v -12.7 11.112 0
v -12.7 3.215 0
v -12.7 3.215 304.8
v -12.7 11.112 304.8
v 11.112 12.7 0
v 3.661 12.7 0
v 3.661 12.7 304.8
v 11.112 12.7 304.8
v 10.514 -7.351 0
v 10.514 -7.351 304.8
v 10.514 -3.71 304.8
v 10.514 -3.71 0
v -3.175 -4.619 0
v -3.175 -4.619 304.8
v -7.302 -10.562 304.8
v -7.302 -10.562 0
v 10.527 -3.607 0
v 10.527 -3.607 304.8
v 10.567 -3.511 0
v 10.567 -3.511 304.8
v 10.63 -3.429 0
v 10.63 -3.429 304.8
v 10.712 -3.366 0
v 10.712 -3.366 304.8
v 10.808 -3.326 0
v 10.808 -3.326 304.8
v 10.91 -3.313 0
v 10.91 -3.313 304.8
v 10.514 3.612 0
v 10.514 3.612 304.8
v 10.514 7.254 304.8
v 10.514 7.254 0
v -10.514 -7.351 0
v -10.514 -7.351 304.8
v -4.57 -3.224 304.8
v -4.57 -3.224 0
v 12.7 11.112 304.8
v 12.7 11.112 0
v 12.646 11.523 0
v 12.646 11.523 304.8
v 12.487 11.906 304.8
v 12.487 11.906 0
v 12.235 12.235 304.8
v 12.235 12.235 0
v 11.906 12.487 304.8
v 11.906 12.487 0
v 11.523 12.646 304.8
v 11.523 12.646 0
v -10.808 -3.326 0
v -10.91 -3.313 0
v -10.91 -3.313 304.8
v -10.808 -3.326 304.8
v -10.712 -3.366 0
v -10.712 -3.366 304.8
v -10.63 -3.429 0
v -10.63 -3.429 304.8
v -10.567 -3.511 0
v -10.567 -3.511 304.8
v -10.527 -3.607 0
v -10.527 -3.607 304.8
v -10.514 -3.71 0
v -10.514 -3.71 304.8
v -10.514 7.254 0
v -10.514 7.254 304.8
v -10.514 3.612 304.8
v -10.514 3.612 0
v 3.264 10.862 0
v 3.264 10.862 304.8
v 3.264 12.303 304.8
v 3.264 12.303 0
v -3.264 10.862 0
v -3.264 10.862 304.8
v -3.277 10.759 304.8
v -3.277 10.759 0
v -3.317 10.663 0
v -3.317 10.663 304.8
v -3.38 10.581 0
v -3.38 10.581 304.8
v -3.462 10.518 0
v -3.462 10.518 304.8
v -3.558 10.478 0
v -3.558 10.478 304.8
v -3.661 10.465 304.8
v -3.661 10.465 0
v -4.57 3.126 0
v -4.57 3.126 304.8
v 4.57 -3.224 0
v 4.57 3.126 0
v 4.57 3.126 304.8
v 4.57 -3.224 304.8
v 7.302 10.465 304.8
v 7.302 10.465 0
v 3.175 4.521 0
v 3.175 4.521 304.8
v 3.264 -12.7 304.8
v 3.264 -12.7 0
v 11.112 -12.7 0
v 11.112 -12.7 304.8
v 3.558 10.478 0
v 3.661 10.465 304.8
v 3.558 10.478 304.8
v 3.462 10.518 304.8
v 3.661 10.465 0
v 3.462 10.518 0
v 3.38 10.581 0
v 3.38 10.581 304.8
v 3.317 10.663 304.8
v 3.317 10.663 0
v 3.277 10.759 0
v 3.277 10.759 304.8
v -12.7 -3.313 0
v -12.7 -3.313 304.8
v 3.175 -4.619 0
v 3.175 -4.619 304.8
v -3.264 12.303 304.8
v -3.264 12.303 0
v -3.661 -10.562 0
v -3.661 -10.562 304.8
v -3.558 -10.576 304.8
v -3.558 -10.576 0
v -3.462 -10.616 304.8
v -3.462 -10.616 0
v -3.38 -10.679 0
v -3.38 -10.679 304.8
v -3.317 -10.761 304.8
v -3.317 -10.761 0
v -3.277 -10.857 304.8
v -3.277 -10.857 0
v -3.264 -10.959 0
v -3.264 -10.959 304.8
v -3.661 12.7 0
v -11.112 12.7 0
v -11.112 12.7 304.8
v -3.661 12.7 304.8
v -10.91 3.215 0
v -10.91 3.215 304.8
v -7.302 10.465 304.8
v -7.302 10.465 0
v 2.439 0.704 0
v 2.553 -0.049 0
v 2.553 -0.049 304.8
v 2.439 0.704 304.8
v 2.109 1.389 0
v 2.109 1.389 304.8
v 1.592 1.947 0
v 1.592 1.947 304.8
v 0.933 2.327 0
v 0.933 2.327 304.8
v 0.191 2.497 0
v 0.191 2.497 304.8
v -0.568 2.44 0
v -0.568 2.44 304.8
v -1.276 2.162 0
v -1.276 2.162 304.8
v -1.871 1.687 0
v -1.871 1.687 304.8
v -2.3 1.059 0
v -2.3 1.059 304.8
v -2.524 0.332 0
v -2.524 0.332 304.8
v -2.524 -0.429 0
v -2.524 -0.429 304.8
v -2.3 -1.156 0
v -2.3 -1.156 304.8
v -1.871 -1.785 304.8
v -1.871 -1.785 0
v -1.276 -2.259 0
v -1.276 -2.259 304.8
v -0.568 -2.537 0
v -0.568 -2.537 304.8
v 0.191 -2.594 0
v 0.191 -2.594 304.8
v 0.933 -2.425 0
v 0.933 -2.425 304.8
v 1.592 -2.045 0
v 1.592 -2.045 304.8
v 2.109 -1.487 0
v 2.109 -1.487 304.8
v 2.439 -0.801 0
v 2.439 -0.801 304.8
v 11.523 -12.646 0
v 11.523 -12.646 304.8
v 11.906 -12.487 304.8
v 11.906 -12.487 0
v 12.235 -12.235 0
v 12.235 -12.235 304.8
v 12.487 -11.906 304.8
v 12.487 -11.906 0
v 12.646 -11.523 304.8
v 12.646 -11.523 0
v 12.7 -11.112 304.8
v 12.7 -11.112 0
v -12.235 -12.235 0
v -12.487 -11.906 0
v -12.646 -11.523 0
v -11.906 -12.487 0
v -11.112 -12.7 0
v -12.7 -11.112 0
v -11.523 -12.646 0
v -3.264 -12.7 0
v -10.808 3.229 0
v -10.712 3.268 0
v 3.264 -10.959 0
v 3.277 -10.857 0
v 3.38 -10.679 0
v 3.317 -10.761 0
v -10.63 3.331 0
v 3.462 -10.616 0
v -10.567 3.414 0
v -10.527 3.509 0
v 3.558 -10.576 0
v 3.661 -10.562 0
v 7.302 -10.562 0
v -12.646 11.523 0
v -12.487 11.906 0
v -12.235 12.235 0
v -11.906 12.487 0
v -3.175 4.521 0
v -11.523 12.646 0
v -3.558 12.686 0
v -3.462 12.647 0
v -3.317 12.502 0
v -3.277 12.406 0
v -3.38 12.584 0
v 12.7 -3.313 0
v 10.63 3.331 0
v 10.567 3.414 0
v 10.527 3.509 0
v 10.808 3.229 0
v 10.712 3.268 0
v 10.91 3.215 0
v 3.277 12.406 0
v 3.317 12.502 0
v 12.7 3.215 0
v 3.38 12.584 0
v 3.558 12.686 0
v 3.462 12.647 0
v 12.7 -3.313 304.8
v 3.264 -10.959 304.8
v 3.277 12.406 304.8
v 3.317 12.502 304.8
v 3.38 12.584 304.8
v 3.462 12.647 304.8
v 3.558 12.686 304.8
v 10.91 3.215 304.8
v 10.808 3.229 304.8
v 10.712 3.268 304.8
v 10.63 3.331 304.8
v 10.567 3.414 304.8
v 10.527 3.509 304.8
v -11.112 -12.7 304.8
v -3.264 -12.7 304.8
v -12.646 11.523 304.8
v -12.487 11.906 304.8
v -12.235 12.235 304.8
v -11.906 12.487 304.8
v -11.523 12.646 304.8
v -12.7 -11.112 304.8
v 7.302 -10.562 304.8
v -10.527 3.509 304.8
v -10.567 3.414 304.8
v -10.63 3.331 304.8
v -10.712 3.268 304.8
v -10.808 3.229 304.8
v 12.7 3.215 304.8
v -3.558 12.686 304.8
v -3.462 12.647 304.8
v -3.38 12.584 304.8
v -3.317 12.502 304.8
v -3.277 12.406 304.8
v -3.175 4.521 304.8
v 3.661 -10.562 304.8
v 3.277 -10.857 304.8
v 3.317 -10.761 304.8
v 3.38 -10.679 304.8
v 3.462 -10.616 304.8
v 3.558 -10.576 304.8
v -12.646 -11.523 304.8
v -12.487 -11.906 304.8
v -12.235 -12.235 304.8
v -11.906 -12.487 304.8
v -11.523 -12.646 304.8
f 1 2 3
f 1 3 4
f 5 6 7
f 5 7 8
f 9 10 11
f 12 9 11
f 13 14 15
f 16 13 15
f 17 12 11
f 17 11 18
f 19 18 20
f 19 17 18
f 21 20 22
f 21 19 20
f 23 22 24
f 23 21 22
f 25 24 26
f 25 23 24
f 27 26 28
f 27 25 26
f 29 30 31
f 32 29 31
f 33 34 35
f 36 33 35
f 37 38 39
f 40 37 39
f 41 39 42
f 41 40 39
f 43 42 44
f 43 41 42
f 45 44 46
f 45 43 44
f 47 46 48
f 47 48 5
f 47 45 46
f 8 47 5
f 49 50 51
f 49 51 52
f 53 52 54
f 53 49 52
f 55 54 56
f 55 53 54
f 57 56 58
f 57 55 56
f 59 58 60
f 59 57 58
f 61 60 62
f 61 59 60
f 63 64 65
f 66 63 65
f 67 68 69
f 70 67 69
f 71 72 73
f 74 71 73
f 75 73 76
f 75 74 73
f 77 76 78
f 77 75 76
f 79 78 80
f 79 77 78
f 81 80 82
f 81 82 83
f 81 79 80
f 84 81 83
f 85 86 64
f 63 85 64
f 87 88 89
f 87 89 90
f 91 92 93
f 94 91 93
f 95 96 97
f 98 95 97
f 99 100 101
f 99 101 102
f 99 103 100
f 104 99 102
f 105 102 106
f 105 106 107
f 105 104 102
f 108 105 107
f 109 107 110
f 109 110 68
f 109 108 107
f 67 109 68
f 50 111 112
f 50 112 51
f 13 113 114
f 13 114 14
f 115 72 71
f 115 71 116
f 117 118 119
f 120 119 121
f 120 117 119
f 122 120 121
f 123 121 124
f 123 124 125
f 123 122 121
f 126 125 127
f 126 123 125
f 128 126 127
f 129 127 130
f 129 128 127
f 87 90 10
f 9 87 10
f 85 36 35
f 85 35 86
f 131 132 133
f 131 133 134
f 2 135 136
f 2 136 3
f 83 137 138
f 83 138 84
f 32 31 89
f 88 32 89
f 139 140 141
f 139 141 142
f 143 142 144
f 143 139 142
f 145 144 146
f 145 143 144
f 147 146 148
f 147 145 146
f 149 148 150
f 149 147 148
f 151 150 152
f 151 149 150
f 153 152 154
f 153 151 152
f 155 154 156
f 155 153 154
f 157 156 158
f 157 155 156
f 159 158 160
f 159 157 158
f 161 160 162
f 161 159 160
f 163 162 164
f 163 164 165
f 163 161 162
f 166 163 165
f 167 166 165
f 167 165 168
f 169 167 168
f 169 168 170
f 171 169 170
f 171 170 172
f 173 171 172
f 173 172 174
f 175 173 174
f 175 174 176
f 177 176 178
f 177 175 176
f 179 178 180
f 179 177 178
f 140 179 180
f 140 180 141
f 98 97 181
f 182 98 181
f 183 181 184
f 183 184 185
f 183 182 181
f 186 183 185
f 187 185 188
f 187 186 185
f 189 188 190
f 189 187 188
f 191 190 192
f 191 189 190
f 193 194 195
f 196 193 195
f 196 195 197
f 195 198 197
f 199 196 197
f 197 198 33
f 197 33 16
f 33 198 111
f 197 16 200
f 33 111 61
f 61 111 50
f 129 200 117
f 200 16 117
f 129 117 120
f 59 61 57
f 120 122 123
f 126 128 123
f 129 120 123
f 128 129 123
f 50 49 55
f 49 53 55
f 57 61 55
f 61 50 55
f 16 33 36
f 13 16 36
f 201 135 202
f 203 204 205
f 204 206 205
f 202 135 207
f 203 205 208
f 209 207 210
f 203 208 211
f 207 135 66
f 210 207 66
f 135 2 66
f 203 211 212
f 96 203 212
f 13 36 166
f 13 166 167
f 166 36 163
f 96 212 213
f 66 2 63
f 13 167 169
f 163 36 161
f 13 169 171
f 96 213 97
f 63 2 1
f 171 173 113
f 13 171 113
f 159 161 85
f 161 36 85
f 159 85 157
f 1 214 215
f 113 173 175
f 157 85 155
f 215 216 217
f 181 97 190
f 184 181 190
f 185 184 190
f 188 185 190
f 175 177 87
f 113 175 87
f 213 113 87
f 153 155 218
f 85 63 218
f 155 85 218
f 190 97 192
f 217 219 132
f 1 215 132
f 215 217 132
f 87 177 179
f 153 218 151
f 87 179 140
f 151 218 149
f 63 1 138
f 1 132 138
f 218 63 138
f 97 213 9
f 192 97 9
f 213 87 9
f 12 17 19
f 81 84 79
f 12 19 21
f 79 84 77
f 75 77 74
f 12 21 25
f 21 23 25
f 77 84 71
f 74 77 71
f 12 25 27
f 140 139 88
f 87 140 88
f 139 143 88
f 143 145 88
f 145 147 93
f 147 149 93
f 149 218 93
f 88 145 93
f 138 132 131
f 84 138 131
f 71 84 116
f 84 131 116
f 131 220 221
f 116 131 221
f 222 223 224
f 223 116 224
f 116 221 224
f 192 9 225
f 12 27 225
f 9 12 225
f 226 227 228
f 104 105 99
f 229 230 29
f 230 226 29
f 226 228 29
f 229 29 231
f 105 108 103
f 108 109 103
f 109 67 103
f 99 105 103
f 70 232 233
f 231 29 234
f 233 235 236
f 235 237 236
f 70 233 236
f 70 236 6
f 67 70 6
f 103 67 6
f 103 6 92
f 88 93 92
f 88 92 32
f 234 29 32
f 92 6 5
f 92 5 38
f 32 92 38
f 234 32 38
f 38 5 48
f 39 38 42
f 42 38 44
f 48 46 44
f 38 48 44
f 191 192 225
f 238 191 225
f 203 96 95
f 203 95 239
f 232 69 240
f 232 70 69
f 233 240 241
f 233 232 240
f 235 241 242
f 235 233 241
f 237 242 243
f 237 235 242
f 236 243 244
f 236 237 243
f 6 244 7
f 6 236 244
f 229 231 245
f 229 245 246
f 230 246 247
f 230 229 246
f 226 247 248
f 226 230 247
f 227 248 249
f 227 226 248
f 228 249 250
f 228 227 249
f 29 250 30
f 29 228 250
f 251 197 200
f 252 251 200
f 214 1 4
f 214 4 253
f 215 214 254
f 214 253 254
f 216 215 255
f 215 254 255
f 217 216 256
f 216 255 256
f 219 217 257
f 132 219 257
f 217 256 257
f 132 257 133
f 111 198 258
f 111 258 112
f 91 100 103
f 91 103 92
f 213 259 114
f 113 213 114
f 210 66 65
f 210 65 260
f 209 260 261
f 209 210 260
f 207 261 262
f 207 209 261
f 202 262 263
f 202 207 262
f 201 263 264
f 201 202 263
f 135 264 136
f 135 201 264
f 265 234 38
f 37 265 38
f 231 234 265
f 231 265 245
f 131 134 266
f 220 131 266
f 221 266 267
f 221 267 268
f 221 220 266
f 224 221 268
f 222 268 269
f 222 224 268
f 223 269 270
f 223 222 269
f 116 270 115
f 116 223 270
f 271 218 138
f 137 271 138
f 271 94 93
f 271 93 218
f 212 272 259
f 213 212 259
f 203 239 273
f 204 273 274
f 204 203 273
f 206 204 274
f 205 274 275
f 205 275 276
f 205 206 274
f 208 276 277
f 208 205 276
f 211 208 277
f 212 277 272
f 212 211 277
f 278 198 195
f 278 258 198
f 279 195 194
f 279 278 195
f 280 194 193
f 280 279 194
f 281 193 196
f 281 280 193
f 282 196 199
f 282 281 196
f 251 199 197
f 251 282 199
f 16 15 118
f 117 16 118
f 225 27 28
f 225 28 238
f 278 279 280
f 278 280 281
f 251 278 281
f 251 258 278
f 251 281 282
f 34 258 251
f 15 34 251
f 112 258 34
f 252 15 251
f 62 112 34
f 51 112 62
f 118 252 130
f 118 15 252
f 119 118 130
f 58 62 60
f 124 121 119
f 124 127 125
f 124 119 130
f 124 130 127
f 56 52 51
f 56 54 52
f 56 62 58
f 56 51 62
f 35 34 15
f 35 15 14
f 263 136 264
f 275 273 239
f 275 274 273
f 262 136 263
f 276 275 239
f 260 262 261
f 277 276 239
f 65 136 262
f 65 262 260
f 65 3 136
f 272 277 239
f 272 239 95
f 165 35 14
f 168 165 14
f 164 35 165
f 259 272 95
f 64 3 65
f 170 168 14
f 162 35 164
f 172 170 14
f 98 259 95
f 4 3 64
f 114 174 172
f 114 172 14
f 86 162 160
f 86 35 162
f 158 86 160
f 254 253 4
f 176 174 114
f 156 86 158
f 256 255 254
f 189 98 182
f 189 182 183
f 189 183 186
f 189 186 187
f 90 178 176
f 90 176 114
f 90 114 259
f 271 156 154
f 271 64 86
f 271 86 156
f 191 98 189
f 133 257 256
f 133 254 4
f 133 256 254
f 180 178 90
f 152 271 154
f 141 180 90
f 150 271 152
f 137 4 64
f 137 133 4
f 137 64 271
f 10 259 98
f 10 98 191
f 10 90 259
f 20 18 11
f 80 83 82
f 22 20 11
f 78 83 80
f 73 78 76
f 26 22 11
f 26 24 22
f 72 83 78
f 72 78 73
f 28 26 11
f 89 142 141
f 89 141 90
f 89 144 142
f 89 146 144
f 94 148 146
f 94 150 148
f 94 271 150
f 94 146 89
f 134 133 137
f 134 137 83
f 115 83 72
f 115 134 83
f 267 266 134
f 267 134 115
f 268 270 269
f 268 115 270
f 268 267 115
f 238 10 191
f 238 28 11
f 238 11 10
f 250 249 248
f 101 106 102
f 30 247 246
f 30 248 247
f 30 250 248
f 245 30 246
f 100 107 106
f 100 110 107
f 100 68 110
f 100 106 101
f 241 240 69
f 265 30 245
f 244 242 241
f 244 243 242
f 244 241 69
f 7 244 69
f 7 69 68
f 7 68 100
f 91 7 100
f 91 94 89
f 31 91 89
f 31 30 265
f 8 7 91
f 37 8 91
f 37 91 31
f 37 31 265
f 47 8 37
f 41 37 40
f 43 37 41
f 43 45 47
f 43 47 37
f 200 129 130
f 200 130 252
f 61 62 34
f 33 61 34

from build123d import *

# Parameters (mm, degrees)
SKETCH1_W           = 25.4
SKETCH1_H           = 25.4
BOSS_EXTRUDE1_DEPTH = 304.8
FILLET1_R           = 1.5875
HOLE1_OUTLINE_R     = 2.5527
HOLE1_DEPTH         = 304.8
SKETCH7_W           = 6.5278
SKETCH7_H           = 2.2352
CUT_EXTRUDE2_DEPTH  = 304.8
FILLET4_R           = 0.396875
CIRPATTERN2_DEPTH   = 304.8


# Read off the part's stored shape, not the designer's step: Hole1, CirPattern2
with BuildPart() as part:
    # Sketch1 → Boss-Extrude1 (new body)
    with BuildSketch(Plane.XY):
        Rectangle(SKETCH1_W, SKETCH1_H)
    extrude(amount=BOSS_EXTRUDE1_DEPTH)

    # Fillet1
    fillet1_edges = [part.edges().sort_by_distance(p)[0] for p in [
        (12.7, -12.7, 152.4),
        (-12.7, -12.7, 152.4),
        (-12.7, 12.7, 152.4),
        (12.7, 12.7, 152.4),
    ]]
    fillet(fillet1_edges, radius=FILLET1_R)

    # Hole1 outline → Hole1 (cut)
    with BuildSketch(Plane.XY):
        with Locations((0, -0.048792482)):
            Circle(HOLE1_OUTLINE_R)
    extrude(amount=HOLE1_DEPTH, mode=Mode.SUBTRACT)

    # Sketch7 → Cut-Extrude2 (cut)
    with BuildSketch(Plane.XY.offset(304.8)):
        with Locations((0, 11.5824)):
            Rectangle(SKETCH7_W, SKETCH7_H)
        Polygon((-3.175, 4.5212), (-7.3025, 10.4648), (7.3025, 10.4648), (3.175, 4.5212), align=None)
    extrude(amount=-CUT_EXTRUDE2_DEPTH, mode=Mode.SUBTRACT)

    # Fillet4
    fillet4_edges = [part.edges().sort_by_distance(p)[0] for p in [
        (-3.2639, 10.4648, 152.4),
        (-3.2639, 12.7, 152.4),
        (3.2639, 12.7, 152.4),
        (3.2639, 10.4648, 152.4),
    ]]
    fillet(fillet4_edges, radius=FILLET4_R)

    # CirPattern2 outline → CirPattern2 (cut)
    with BuildSketch(Plane.XY):
        with BuildLine():
            ThreePointArc((-3.660775, -10.562384964), (-3.380141996, -10.67862696), (-3.2639, -10.959259964))
            Line((-3.2639, -10.959259964), (-3.2639, -12.7))
            Line((-3.2639, -12.7), (3.2639, -12.7))
            Line((3.2639, -12.7), (3.2639, -10.959259964))
            ThreePointArc((3.2639, -10.959259964), (3.380141996, -10.67862696), (3.660775, -10.562384964))
            Line((3.660775, -10.562384964), (7.3025, -10.562384964))
            Line((7.3025, -10.562384964), (3.175, -4.618784964))
            Line((3.175, -4.618784964), (-3.175, -4.618784964))
            Line((-3.175, -4.618784964), (-7.3025, -10.562384964))
            Line((-7.3025, -10.562384964), (-3.660775, -10.562384964))
        make_face()
        with BuildLine():
            Line((-12.7, -3.312692482), (-10.910467482, -3.312692482))
            ThreePointArc((-10.910467482, -3.312692482), (-10.629834478, -3.428934478), (-10.513592482, -3.709567482))
            Line((-10.513592482, -3.709567482), (-10.513592482, -7.351292482))
            Line((-10.513592482, -7.351292482), (-4.569992482, -3.223792482))
            Line((-4.569992482, -3.223792482), (-4.569992482, 3.126207518))
            Line((-4.569992482, 3.126207518), (-10.513592482, 7.253707518))
            Line((-10.513592482, 7.253707518), (-10.513592482, 3.611982518))
            ThreePointArc((-10.513592482, 3.611982518), (-10.629834478, 3.331349514), (-10.910467482, 3.215107518))
            Line((-10.910467482, 3.215107518), (-12.7, 3.215107518))
            Line((-12.7, 3.215107518), (-12.7, -3.312692482))
        make_face()
        with BuildLine():
            ThreePointArc((10.513592482, -3.709567482), (10.629834478, -3.428934478), (10.910467482, -3.312692482))
            Line((10.910467482, -3.312692482), (12.7, -3.312692482))
            Line((12.7, -3.312692482), (12.7, 3.215107518))
            Line((12.7, 3.215107518), (10.910467482, 3.215107518))
            ThreePointArc((10.910467482, 3.215107518), (10.629834478, 3.331349514), (10.513592482, 3.611982518))
            Line((10.513592482, 3.611982518), (10.513592482, 7.253707518))
            Line((10.513592482, 7.253707518), (4.569992482, 3.126207518))
            Line((4.569992482, 3.126207518), (4.569992482, -3.223792482))
            Line((4.569992482, -3.223792482), (10.513592482, -7.351292482))
            Line((10.513592482, -7.351292482), (10.513592482, -3.709567482))
        make_face()
    extrude(amount=CIRPATTERN2_DEPTH, mode=Mode.SUBTRACT)


solid = part.part
